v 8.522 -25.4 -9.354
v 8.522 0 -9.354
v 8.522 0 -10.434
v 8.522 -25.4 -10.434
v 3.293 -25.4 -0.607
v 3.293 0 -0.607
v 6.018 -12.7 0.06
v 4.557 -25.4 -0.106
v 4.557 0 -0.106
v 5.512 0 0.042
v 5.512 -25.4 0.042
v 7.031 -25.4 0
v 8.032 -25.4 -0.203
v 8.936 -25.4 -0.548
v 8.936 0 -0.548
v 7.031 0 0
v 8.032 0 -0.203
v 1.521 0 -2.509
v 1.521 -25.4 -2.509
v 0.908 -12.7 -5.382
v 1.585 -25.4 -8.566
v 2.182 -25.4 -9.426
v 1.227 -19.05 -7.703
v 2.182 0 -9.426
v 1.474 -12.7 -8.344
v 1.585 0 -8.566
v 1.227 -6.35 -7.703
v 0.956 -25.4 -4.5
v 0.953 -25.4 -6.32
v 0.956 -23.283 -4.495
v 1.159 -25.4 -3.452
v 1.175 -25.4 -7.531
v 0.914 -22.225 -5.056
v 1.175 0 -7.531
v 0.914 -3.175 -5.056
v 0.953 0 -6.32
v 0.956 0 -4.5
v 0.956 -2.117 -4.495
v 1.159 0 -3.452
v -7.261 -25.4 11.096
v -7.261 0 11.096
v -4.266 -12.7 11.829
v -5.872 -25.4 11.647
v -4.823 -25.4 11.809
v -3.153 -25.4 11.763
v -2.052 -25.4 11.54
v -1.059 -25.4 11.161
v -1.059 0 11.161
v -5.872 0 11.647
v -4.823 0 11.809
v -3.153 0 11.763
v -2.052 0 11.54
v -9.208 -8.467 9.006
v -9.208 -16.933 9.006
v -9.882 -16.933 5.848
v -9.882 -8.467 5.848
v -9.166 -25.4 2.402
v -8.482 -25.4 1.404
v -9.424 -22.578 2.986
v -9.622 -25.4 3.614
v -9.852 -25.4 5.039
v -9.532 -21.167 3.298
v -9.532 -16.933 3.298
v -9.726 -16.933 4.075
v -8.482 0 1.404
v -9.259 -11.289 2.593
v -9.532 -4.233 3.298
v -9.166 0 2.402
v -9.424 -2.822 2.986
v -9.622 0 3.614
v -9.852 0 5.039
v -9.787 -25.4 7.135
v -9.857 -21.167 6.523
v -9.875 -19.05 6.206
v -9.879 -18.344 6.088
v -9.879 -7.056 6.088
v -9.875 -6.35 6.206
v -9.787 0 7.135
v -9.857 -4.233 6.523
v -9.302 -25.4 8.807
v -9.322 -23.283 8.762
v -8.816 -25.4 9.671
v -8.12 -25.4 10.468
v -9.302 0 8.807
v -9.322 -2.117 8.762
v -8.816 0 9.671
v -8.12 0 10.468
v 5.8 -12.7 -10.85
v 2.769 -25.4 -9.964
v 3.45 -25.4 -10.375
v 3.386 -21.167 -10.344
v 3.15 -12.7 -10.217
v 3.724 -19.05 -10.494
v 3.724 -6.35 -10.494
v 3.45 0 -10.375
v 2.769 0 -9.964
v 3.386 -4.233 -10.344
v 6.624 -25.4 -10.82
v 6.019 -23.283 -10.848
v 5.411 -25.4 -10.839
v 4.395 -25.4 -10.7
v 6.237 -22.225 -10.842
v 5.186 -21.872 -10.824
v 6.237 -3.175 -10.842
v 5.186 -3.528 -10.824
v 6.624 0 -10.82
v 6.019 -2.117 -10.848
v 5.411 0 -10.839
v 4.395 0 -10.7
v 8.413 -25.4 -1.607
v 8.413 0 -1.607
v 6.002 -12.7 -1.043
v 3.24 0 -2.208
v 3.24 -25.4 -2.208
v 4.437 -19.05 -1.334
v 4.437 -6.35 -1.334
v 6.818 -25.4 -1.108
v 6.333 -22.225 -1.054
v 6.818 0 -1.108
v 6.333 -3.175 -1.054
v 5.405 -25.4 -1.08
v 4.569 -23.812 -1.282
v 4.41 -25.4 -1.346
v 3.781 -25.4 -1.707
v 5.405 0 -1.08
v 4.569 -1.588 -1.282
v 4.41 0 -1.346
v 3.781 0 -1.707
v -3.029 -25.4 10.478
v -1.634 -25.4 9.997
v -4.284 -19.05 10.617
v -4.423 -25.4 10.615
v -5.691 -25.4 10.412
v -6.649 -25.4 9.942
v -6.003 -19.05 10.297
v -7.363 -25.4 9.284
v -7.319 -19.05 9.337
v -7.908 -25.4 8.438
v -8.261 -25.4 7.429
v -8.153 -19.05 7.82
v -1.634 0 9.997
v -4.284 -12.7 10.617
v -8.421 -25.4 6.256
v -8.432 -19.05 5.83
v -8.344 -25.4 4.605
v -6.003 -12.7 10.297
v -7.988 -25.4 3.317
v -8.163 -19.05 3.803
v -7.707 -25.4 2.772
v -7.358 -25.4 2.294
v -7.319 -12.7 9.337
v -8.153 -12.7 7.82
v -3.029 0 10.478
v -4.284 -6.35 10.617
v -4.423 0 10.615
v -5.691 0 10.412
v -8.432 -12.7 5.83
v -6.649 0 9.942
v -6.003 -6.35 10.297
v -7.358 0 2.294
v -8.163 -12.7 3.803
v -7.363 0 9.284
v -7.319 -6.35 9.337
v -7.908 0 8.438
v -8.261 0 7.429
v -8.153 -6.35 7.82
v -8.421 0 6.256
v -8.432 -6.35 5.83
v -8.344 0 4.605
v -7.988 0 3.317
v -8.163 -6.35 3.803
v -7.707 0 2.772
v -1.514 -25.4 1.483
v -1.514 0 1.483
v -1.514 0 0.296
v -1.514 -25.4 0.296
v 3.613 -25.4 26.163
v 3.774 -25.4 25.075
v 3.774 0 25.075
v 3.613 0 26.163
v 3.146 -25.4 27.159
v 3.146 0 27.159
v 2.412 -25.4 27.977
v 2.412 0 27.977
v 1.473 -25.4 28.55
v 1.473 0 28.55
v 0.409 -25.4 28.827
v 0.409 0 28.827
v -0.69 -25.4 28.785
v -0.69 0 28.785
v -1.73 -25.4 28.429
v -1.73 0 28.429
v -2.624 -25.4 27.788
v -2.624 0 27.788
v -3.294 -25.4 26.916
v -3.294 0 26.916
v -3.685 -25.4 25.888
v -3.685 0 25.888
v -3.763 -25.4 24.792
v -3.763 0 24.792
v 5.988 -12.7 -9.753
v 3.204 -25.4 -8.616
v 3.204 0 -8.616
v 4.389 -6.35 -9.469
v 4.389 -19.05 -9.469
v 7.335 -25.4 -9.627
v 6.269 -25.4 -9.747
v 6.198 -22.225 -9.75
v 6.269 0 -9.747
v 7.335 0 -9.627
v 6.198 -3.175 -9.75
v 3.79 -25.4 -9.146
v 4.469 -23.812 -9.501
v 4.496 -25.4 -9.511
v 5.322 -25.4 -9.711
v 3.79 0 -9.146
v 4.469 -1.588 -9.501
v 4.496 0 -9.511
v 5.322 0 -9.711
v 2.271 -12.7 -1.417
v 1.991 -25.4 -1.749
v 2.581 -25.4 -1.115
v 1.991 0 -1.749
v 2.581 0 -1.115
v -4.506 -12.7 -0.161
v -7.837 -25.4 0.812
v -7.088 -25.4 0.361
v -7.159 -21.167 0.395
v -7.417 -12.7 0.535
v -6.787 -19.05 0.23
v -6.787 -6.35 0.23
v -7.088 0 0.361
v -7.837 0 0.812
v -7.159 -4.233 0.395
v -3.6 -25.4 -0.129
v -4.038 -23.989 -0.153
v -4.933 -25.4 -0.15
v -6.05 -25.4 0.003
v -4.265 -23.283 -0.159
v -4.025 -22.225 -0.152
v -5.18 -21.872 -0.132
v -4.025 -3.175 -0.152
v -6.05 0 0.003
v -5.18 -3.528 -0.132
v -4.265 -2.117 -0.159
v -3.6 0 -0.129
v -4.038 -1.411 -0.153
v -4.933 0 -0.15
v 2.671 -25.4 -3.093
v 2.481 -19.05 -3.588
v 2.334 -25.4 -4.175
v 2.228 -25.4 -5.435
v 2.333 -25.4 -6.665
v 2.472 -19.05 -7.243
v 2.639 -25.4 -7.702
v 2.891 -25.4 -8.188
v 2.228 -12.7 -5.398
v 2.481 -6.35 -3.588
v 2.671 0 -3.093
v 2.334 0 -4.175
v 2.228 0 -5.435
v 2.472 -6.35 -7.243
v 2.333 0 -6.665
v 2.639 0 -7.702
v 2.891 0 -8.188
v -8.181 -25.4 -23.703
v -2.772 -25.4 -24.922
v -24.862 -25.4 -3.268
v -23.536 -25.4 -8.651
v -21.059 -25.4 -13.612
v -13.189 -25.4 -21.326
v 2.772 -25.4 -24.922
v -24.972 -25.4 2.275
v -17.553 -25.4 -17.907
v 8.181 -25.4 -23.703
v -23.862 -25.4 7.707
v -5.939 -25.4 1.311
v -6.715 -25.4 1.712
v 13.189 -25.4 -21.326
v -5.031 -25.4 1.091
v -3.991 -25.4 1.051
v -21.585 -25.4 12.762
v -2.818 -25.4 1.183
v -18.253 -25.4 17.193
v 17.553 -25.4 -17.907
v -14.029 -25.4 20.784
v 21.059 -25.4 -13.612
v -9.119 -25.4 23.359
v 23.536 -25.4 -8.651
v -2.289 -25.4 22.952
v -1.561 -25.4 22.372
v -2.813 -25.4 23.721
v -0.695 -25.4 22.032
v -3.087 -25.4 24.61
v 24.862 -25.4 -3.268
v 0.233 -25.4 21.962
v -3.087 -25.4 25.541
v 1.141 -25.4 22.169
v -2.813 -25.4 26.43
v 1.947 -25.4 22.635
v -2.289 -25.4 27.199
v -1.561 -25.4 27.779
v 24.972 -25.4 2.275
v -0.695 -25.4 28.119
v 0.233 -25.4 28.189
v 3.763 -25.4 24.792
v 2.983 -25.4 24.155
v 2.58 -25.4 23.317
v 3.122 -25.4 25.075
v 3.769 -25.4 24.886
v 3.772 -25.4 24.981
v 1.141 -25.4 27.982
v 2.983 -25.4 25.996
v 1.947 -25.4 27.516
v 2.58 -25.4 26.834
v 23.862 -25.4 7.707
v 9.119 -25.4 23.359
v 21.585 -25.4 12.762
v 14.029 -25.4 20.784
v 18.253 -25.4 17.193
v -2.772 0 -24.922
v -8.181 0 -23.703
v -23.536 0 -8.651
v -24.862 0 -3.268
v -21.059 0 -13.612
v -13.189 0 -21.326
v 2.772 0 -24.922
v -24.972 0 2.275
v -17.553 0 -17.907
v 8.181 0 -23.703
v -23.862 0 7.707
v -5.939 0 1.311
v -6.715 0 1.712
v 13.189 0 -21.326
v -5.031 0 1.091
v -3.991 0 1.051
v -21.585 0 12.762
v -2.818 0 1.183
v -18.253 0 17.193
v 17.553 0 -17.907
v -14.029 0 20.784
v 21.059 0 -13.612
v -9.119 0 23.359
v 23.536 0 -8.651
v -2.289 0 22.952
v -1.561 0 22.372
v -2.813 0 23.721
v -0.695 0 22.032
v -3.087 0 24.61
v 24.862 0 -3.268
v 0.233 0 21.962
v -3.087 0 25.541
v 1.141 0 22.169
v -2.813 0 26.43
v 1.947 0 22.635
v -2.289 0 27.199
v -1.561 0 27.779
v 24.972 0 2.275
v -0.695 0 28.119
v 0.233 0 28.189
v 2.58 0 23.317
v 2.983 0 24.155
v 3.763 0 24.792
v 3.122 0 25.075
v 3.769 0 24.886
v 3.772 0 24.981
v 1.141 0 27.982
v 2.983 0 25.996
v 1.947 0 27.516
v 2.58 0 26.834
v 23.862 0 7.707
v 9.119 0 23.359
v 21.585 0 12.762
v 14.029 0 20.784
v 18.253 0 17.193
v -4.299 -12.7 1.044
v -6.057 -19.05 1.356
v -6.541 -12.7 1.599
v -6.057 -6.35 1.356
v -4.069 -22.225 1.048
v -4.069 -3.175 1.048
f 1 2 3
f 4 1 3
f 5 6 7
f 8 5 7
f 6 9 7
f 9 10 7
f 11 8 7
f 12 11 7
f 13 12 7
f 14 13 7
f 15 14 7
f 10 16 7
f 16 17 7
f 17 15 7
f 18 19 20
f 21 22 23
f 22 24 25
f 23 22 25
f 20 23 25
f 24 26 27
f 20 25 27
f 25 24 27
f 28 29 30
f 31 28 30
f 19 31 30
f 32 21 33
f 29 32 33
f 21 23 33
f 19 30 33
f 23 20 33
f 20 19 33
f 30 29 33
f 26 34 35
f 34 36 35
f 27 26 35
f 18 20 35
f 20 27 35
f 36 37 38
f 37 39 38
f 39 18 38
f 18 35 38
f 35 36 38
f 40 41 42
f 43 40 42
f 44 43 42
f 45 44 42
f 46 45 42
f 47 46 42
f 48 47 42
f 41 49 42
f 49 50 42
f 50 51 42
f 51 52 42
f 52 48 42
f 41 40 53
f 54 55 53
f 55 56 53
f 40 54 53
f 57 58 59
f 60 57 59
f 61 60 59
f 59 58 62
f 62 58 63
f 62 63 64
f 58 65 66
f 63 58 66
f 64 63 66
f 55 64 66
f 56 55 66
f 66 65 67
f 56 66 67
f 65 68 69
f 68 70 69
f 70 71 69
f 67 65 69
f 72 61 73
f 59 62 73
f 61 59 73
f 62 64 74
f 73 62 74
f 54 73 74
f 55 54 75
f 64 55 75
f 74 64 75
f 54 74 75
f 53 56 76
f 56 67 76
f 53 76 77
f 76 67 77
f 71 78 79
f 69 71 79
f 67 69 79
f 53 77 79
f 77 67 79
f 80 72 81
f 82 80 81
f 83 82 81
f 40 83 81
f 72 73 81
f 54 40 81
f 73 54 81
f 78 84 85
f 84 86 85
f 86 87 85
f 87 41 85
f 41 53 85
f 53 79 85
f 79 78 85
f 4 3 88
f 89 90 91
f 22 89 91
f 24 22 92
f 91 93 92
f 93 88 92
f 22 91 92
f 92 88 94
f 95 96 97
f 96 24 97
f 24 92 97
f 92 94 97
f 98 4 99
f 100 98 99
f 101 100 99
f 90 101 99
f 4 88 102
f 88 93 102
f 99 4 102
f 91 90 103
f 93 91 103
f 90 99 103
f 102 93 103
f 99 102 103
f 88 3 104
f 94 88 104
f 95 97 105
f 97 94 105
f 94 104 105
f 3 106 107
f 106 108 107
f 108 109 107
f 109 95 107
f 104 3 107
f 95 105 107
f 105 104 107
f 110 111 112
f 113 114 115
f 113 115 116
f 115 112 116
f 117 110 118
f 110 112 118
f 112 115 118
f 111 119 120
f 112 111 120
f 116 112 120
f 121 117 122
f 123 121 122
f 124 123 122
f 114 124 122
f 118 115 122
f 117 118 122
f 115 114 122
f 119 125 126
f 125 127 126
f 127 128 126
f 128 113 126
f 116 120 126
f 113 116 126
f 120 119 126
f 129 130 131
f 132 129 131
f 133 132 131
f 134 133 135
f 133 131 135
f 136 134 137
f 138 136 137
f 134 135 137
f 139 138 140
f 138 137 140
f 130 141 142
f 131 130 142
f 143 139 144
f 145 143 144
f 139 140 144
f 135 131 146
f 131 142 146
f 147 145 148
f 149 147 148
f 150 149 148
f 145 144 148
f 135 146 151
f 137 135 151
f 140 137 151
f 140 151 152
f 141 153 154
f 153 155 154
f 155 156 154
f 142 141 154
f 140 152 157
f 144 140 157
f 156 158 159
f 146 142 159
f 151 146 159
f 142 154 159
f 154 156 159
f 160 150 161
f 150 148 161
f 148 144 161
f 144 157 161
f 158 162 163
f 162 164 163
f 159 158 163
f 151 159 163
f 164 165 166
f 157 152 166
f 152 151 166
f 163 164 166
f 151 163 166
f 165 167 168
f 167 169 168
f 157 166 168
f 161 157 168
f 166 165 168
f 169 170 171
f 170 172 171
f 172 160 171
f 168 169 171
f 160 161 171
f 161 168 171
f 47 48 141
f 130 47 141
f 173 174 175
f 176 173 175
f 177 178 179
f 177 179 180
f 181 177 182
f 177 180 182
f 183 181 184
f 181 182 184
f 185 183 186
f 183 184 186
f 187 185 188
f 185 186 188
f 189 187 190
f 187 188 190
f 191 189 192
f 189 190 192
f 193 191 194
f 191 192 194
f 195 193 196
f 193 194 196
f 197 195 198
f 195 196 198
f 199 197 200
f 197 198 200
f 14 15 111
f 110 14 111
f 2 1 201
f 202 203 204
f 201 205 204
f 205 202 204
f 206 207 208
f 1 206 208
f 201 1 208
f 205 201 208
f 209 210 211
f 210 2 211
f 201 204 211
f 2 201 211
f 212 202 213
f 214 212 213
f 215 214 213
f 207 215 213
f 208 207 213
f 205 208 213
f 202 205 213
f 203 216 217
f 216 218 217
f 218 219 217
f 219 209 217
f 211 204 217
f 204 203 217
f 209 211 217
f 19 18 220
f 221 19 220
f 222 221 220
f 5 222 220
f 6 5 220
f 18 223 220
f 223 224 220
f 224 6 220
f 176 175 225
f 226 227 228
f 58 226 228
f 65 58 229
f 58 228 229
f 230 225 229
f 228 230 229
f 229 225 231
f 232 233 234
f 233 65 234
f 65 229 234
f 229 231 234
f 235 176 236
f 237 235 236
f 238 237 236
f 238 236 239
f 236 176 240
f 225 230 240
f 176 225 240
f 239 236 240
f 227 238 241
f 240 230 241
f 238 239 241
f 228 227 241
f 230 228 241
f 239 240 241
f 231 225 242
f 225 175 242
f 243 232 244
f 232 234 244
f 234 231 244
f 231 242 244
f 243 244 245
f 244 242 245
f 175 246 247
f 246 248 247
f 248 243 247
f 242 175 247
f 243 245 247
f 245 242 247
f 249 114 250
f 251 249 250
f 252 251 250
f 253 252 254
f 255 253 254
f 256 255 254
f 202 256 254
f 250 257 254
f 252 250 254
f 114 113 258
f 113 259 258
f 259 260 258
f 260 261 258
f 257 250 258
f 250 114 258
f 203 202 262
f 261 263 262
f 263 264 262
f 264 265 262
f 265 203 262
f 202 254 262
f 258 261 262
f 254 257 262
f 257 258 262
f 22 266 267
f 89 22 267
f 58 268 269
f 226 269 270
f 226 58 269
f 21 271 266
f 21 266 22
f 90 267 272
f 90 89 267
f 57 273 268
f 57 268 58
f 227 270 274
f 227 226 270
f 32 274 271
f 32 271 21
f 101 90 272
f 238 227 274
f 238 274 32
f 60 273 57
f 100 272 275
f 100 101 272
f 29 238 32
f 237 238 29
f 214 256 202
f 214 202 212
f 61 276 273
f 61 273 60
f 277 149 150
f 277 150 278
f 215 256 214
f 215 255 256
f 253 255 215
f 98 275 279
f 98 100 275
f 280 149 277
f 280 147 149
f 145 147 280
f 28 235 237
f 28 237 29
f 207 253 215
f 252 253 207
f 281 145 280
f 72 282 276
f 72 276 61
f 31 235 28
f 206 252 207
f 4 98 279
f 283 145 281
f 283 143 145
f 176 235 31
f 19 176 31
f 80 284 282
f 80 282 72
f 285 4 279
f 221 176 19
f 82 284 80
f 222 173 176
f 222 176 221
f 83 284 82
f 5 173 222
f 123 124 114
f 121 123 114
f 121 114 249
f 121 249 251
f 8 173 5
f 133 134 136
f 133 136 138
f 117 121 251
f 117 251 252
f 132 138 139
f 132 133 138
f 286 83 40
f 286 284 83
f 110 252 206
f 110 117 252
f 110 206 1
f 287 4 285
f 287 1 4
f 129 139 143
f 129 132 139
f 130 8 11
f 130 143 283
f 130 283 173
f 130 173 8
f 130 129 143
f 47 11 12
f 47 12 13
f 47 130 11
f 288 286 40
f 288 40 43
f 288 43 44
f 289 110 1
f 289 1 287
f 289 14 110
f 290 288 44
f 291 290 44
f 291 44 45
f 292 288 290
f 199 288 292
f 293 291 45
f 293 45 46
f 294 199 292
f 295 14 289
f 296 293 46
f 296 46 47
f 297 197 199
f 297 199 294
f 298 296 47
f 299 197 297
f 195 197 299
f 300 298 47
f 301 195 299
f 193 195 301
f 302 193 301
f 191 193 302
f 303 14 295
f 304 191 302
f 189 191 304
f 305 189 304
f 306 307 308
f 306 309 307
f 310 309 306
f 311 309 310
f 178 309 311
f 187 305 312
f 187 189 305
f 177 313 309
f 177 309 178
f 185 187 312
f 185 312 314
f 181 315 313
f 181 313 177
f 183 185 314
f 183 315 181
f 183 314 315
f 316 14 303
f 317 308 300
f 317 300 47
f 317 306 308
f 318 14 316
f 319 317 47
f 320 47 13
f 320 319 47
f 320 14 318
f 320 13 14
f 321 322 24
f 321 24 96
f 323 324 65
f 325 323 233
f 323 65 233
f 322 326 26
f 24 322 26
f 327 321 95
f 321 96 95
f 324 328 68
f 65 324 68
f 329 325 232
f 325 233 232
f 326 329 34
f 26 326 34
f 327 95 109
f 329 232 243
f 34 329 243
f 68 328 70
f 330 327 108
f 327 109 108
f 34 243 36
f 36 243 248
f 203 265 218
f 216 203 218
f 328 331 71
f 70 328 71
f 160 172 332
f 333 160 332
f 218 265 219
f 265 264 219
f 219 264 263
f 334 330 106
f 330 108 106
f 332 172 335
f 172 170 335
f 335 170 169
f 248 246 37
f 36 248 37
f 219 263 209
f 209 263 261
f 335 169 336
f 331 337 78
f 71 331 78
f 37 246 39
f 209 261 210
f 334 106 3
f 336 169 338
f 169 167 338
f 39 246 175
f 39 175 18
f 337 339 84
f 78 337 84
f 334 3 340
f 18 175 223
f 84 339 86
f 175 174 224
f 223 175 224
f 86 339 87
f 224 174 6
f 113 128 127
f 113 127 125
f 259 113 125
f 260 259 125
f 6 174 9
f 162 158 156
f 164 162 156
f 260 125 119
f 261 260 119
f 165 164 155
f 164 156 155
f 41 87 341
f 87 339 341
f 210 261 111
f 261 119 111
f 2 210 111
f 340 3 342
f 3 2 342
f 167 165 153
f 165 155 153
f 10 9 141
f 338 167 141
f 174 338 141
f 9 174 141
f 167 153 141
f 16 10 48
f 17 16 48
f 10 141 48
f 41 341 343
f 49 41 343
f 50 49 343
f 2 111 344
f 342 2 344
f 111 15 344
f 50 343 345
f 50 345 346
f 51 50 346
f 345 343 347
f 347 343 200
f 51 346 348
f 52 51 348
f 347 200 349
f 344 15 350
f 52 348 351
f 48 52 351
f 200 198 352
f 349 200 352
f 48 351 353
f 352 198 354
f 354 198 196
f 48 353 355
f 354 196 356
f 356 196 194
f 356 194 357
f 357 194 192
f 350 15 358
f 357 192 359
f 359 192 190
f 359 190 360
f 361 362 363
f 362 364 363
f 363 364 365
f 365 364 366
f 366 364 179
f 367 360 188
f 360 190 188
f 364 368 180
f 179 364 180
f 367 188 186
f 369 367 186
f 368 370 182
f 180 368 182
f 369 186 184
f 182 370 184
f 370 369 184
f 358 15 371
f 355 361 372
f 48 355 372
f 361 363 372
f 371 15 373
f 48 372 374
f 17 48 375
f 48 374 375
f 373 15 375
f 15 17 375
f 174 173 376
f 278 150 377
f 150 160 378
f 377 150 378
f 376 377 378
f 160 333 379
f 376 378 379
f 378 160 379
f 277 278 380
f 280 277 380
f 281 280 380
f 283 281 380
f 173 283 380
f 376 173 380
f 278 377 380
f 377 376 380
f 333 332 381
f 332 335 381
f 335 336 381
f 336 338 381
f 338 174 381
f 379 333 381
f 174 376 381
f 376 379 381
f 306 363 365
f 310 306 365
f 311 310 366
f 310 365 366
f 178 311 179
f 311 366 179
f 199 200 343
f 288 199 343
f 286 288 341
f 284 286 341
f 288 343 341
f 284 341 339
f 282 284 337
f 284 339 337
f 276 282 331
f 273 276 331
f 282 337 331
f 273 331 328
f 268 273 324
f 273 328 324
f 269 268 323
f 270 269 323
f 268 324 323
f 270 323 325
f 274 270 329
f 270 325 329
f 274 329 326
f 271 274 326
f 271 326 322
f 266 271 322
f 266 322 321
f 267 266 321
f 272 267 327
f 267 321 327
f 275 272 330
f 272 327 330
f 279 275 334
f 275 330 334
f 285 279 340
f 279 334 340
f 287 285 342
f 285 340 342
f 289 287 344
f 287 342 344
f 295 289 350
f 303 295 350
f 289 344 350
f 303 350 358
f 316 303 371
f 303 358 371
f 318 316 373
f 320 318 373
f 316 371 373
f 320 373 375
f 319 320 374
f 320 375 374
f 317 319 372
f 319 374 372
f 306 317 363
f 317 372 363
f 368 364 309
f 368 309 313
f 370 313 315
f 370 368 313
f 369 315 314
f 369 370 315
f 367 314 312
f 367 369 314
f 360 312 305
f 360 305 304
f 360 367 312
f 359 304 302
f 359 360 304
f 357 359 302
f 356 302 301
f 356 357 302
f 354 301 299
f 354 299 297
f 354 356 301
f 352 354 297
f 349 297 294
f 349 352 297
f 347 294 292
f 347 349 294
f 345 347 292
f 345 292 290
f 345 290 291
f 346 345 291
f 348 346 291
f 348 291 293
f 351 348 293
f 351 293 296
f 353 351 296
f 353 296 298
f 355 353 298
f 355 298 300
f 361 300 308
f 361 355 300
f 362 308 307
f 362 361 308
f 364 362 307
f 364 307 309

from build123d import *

# Parameters (mm, degrees)
F0_R     = 3.1220096901
F1_DEPTH = 25.4


with BuildPart() as f1:
    # F0 (on Front) → F1 (new body)
    with BuildSketch(Plane.XZ):
        with BuildLine():
            ThreePointArc((3.762887104, 24.7915036788), (0, 21.3018608193), (-3.762887104, 24.7915036788))
            ThreePointArc((-3.762887104, 24.7915036788), (0, -25.0754456394), (3.762887104, 24.7915036788))
        make_face()
        with BuildLine():
            add(Edge.make_bspline(
                [(8.4130730817, -1.6073568671), (7.2075554314, -1.0429237476), (6.0020377811, -1.0429237476)],
                knots=[0, 0, 0, 1, 1, 1], degree=2))
            add(Edge.make_bspline(
                [(6.0020377811, -1.0429237476), (4.2529919416, -1.0429237476), (3.2402642046, -2.2077929222)],
                knots=[0, 0, 0, 1, 1, 1], degree=2))
            add(Edge.make_bspline(
                [(3.2402642046, -2.2077929222), (2.2275364675, -3.3726620968), (2.2275364675, -5.3981175709)],
                knots=[0, 0, 0, 1, 1, 1], degree=2))
            add(Edge.make_bspline(
                [(2.2275364675, -5.3981175709), (2.2275364675, -7.479319526), (3.204261269, -8.6163154601)],
                knots=[0, 0, 0, 1, 1, 1], degree=2))
            add(Edge.make_bspline(
                [(3.204261269, -8.6163154601), (4.1809860704, -9.7533113943), (5.9881011609, -9.7533113943)],
                knots=[0, 0, 0, 1, 1, 1], degree=2))
            add(Edge.make_bspline(
                [(5.9881011609, -9.7533113943), (7.0983852396, -9.7533113943), (8.5222432735, -9.3537949476)],
                knots=[0, 0, 0, 1, 1, 1], degree=2))
            Line((8.5222432735, -9.3537949476), (8.5222432735, -10.4338830157))
            add(Edge.make_bspline(
                [(8.5222432735, -10.4338830157), (7.418927505, -10.8496588527), (5.7999567877, -10.8496588527)],
                knots=[0, 0, 0, 1, 1, 1], degree=2))
            add(Edge.make_bspline(
                [(5.7999567877, -10.8496588527), (3.4562818182, -10.8496588527), (2.1822424518, -9.4258008188)],
                knots=[0, 0, 0, 1, 1, 1], degree=2))
            add(Edge.make_bspline(
                [(2.1822424518, -9.4258008188), (0.9082030853, -8.0019427848), (0.9082030853, -5.3818581807)],
                knots=[0, 0, 0, 1, 1, 1], degree=2))
            add(Edge.make_bspline(
                [(0.9082030853, -5.3818581807), (0.9082030853, -3.741982533), (1.5214143756, -2.5085916423)],
                knots=[0, 0, 0, 1, 1, 1], degree=2))
            add(Edge.make_bspline(
                [(1.5214143756, -2.5085916423), (2.134625666, -1.2752007515), (3.2925265305, -0.6074043652)],
                knots=[0, 0, 0, 1, 1, 1], degree=2))
            add(Edge.make_bspline(
                [(3.2925265305, -0.6074043652), (4.450427395, 0.060392021), (6.0182971714, 0.060392021)],
                knots=[0, 0, 0, 1, 1, 1], degree=2))
            add(Edge.make_bspline(
                [(6.0182971714, 0.060392021), (7.6860460595, 0.060392021), (8.9356963405, -0.5481737292)],
                knots=[0, 0, 0, 1, 1, 1], degree=2))
            Line((8.9356963405, -0.5481737292), (8.4130730817, -1.6073568671))
        make_face(mode=Mode.SUBTRACT)
        with BuildLine():
            add(Edge.make_bspline(
                [(-1.6337582686, 9.9965584062), (-2.9586341146, 10.6168759988), (-4.2835099606, 10.6168759988)],
                knots=[0, 0, 0, 1, 1, 1], degree=2))
            add(Edge.make_bspline(
                [(-4.2835099606, 10.6168759988), (-6.2057286735, 10.6168759988), (-7.318726494, 9.3366732305)],
                knots=[0, 0, 0, 1, 1, 1], degree=2))
            add(Edge.make_bspline(
                [(-7.318726494, 9.3366732305), (-8.4317243145, 8.0564704622), (-8.4317243145, 5.8304748212)],
                knots=[0, 0, 0, 1, 1, 1], degree=2))
            add(Edge.make_bspline(
                [(-8.4317243145, 5.8304748212), (-8.4317243145, 3.5432132451), (-7.3582940771, 2.2936434443)],
                knots=[0, 0, 0, 1, 1, 1], degree=2))
            add(Edge.make_bspline(
                [(-7.3582940771, 2.2936434443), (-6.2848638396, 1.0440736435), (-4.2988264443, 1.0440736435)],
                knots=[0, 0, 0, 1, 1, 1], degree=2))
            add(Edge.make_bspline(
                [(-4.2988264443, 1.0440736435), (-3.0786132374, 1.0440736435), (-1.5137791458, 1.4831461782)],
                knots=[0, 0, 0, 1, 1, 1], degree=2))
            Line((-1.5137791458, 1.4831461782), (-1.5137791458, 0.2961186862))
            add(Edge.make_bspline(
                [(-1.5137791458, 0.2961186862), (-2.7263341108, -0.1608230796), (-4.5055989752, -0.1608230796)],
                knots=[0, 0, 0, 1, 1, 1], degree=2))
            add(Edge.make_bspline(
                [(-4.5055989752, -0.1608230796), (-7.0813209956, -0.1608230796), (-8.4815028868, 1.4040110121)],
                knots=[0, 0, 0, 1, 1, 1], degree=2))
            add(Edge.make_bspline(
                [(-8.4815028868, 1.4040110121), (-9.8816847779, 2.9688451038), (-9.8816847779, 5.8483440522)],
                knots=[0, 0, 0, 1, 1, 1], degree=2))
            add(Edge.make_bspline(
                [(-9.8816847779, 5.8483440522), (-9.8816847779, 7.6505836423), (-9.2077594921, 9.0060924558)],
                knots=[0, 0, 0, 1, 1, 1], degree=2))
            add(Edge.make_bspline(
                [(-9.2077594921, 9.0060924558), (-8.5338342063, 10.3616012693), (-7.2612896799, 11.0955161166)],
                knots=[0, 0, 0, 1, 1, 1], degree=2))
            add(Edge.make_bspline(
                [(-7.2612896799, 11.0955161166), (-5.9887451534, 11.8294309638), (-4.2656407295, 11.8294309638)],
                knots=[0, 0, 0, 1, 1, 1], degree=2))
            add(Edge.make_bspline(
                [(-4.2656407295, 11.8294309638), (-2.4327681719, 11.8294309638), (-1.0593901273, 11.1606111726)],
                knots=[0, 0, 0, 1, 1, 1], degree=2))
            Line((-1.0593901273, 11.1606111726), (-1.6337582686, 9.9965584062))
        make_face(mode=Mode.SUBTRACT)
        with BuildLine():
            ThreePointArc((3.7735848201, 25.0754456394), (-0.1420717056, 28.8463550821), (-3.762887104, 24.7915036788))
            ThreePointArc((-3.762887104, 24.7915036788), (0, 21.3018608193), (3.762887104, 24.7915036788))
            ThreePointArc((3.762887104, 24.7915036788), (3.7709094427, 24.9333739338), (3.7735848201, 25.0754456394))
        make_face()
        with Locations((0, 25.0754456394)):
            Circle(F0_R, mode=Mode.SUBTRACT)
    extrude(amount=F1_DEPTH)


solid = f1.part
